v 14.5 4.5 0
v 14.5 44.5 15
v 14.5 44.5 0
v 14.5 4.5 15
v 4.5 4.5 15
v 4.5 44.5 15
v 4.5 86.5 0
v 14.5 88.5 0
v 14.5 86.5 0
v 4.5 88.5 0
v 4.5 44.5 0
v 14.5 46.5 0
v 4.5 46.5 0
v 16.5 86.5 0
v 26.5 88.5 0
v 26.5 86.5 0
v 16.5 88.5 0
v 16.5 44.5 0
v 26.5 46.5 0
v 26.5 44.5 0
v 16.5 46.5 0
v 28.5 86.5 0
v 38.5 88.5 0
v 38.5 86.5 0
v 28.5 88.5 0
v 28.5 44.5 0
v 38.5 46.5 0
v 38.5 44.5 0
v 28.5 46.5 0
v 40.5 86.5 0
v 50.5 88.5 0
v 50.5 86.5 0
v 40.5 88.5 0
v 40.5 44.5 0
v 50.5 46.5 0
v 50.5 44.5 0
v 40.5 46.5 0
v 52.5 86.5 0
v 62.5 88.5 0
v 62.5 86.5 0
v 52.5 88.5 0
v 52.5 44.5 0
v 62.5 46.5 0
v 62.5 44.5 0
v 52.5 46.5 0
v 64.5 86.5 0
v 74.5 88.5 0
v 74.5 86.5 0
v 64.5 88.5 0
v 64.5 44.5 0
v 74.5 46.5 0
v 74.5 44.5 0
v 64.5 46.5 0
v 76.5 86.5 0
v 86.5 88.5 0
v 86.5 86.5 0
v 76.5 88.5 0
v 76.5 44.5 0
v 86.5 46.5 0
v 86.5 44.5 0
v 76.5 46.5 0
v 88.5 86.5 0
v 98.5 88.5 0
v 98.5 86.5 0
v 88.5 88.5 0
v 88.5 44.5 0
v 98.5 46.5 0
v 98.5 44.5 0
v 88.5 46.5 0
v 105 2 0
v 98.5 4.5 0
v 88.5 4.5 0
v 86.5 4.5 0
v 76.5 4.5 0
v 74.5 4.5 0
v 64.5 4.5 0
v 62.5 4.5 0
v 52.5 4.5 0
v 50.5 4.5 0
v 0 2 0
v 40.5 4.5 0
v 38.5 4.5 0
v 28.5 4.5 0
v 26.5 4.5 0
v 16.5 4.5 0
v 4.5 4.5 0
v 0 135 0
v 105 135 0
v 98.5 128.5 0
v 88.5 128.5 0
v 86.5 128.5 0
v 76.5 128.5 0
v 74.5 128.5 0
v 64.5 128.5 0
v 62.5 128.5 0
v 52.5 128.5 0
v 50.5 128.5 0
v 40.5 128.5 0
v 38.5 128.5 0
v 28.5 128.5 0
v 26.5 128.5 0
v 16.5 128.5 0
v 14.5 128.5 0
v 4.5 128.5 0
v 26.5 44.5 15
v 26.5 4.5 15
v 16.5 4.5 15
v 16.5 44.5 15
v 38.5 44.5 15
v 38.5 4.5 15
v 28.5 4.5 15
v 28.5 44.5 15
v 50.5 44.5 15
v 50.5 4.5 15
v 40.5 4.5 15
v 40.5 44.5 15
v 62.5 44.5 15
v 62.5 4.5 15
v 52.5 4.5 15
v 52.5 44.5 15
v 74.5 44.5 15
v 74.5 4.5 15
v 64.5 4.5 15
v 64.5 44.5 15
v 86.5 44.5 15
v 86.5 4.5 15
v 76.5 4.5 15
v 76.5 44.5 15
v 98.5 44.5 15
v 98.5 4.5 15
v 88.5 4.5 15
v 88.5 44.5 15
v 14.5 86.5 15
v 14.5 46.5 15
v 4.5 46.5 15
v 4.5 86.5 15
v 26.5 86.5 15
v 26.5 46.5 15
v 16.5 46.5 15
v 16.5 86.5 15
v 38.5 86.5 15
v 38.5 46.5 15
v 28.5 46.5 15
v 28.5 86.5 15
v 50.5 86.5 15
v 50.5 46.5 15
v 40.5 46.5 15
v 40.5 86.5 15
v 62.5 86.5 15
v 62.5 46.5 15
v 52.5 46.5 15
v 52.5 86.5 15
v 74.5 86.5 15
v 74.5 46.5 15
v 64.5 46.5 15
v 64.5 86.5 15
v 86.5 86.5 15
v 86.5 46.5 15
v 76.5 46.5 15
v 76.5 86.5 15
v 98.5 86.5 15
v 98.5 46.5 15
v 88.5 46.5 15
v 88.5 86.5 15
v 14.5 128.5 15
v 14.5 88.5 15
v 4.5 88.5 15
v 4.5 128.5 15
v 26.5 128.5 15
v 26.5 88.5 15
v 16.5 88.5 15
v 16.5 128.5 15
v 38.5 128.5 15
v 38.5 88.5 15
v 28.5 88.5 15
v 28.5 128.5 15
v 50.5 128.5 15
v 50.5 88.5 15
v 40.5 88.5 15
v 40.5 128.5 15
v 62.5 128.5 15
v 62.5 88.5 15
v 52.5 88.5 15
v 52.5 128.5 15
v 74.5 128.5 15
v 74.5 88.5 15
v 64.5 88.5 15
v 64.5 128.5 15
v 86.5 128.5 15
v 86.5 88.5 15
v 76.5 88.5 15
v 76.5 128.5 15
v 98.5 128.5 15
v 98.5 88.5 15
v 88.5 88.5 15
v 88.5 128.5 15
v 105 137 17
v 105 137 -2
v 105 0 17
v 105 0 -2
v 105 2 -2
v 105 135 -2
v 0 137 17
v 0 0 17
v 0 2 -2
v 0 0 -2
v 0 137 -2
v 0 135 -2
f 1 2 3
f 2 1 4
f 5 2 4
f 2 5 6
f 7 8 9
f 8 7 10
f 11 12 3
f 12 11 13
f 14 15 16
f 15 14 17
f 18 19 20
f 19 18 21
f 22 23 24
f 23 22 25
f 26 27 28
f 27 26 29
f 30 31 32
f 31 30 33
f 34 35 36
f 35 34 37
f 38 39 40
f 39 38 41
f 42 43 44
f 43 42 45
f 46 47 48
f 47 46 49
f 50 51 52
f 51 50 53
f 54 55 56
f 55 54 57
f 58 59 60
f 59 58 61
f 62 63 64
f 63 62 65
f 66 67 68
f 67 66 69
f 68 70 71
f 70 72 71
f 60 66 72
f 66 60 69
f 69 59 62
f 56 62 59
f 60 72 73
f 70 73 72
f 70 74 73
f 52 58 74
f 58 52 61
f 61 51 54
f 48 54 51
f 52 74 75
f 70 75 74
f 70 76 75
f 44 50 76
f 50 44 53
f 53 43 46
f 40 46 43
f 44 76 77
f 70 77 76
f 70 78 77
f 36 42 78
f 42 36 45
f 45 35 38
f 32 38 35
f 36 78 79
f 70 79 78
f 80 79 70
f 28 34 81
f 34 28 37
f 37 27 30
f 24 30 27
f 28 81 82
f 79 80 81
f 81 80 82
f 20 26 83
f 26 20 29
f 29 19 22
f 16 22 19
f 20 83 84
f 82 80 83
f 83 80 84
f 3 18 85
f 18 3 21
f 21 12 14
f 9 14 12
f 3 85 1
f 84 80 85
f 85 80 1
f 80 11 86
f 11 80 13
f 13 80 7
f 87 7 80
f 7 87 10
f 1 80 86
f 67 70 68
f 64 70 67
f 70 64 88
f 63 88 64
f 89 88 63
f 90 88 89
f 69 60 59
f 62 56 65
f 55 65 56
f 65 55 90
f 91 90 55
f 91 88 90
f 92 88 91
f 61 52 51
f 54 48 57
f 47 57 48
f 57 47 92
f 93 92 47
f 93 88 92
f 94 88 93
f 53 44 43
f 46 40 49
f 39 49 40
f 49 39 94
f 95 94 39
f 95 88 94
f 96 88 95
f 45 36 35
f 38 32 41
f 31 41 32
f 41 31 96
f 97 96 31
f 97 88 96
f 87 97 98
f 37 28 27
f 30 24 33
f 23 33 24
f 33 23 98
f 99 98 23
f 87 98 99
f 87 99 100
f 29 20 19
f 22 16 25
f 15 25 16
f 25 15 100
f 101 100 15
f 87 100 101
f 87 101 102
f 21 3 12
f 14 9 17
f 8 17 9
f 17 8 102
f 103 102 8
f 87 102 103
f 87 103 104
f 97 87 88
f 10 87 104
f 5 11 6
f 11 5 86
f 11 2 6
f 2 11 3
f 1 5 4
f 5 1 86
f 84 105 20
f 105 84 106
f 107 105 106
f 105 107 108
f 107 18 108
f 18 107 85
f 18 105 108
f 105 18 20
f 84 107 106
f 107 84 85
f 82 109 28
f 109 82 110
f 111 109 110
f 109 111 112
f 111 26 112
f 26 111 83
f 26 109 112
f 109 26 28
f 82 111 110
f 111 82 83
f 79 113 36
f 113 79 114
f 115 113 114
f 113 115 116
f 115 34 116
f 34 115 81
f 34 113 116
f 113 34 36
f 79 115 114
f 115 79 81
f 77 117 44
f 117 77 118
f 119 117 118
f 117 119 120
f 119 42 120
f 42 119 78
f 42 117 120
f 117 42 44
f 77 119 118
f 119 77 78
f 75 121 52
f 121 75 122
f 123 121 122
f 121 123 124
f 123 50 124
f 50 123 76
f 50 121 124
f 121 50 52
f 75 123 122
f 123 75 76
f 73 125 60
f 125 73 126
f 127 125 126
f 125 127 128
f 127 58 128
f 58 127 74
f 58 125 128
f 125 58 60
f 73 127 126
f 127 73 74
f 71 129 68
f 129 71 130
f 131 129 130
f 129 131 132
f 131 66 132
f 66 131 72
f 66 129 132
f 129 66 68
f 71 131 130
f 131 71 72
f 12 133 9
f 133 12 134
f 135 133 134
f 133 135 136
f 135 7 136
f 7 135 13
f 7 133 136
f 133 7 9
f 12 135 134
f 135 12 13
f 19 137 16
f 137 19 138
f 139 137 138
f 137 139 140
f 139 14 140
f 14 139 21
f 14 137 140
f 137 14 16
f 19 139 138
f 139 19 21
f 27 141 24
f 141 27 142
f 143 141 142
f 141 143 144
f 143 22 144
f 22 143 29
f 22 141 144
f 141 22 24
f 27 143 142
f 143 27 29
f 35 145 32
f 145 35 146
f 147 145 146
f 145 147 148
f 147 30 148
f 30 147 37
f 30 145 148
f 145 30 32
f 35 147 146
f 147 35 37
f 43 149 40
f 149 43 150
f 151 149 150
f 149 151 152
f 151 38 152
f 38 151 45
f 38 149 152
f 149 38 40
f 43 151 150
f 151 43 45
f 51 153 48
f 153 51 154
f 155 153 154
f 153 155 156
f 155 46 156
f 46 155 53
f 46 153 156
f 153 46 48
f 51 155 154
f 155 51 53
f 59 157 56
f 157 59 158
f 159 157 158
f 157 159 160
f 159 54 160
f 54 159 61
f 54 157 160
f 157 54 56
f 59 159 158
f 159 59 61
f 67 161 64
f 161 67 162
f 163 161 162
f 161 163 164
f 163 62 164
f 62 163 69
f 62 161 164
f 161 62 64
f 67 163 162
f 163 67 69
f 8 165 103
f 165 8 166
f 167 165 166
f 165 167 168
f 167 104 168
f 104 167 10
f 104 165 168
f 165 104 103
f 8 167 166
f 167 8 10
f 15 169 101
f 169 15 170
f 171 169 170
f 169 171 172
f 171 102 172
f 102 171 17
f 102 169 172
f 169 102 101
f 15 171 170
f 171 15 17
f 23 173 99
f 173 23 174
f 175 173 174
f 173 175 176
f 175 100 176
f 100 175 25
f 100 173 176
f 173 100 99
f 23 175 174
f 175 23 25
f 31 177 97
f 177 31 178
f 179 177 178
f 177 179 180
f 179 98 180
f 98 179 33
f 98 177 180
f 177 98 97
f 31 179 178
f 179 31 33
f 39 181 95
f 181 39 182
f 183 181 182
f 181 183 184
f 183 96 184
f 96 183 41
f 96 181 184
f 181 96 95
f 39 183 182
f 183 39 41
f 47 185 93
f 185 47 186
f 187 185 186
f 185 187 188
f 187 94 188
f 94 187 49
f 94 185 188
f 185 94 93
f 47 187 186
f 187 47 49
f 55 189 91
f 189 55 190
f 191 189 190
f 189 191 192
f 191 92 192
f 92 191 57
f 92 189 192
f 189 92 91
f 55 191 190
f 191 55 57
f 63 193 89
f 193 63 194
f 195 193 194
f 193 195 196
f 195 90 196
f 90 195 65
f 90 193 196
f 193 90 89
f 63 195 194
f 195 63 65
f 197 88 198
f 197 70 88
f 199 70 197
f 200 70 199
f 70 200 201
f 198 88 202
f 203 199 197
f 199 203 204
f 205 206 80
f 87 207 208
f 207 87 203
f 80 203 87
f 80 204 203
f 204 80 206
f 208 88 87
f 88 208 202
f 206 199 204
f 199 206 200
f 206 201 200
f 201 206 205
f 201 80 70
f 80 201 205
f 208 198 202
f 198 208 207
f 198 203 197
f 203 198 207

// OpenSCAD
width=105;
length=135;
bthickness=2;
wthickness=2;

mwidth=10;
mlength=40;
mdepth=15;

rows=8;
cols=3;


offs_x = (width - (mwidth + wthickness) * rows)/2;
offs_y = (length - (mlength + wthickness) * cols)/2;


difference() {
cube([width,length,bthickness+mdepth]);

for (j= [0:1:cols-1]) {
 for (i= [0:1:rows-1]) {
	translate([offs_x + i*(mwidth+wthickness),offs_y + j*(mlength+wthickness),0]) cube([mwidth,mlength,mdepth]);
 }
}

}

//translate([0,0,-bthickness])cube([bthickness,length,bthickness*2+mdepth]);
//translate([width,0,-bthickness])cube([bthickness,length,bthickness*2+mdepth]);
translate([0,0,-bthickness])cube([width,bthickness,bthickness*2+mdepth]);
translate([0,length,-bthickness])cube([width,bthickness,bthickness*2+mdepth]);
